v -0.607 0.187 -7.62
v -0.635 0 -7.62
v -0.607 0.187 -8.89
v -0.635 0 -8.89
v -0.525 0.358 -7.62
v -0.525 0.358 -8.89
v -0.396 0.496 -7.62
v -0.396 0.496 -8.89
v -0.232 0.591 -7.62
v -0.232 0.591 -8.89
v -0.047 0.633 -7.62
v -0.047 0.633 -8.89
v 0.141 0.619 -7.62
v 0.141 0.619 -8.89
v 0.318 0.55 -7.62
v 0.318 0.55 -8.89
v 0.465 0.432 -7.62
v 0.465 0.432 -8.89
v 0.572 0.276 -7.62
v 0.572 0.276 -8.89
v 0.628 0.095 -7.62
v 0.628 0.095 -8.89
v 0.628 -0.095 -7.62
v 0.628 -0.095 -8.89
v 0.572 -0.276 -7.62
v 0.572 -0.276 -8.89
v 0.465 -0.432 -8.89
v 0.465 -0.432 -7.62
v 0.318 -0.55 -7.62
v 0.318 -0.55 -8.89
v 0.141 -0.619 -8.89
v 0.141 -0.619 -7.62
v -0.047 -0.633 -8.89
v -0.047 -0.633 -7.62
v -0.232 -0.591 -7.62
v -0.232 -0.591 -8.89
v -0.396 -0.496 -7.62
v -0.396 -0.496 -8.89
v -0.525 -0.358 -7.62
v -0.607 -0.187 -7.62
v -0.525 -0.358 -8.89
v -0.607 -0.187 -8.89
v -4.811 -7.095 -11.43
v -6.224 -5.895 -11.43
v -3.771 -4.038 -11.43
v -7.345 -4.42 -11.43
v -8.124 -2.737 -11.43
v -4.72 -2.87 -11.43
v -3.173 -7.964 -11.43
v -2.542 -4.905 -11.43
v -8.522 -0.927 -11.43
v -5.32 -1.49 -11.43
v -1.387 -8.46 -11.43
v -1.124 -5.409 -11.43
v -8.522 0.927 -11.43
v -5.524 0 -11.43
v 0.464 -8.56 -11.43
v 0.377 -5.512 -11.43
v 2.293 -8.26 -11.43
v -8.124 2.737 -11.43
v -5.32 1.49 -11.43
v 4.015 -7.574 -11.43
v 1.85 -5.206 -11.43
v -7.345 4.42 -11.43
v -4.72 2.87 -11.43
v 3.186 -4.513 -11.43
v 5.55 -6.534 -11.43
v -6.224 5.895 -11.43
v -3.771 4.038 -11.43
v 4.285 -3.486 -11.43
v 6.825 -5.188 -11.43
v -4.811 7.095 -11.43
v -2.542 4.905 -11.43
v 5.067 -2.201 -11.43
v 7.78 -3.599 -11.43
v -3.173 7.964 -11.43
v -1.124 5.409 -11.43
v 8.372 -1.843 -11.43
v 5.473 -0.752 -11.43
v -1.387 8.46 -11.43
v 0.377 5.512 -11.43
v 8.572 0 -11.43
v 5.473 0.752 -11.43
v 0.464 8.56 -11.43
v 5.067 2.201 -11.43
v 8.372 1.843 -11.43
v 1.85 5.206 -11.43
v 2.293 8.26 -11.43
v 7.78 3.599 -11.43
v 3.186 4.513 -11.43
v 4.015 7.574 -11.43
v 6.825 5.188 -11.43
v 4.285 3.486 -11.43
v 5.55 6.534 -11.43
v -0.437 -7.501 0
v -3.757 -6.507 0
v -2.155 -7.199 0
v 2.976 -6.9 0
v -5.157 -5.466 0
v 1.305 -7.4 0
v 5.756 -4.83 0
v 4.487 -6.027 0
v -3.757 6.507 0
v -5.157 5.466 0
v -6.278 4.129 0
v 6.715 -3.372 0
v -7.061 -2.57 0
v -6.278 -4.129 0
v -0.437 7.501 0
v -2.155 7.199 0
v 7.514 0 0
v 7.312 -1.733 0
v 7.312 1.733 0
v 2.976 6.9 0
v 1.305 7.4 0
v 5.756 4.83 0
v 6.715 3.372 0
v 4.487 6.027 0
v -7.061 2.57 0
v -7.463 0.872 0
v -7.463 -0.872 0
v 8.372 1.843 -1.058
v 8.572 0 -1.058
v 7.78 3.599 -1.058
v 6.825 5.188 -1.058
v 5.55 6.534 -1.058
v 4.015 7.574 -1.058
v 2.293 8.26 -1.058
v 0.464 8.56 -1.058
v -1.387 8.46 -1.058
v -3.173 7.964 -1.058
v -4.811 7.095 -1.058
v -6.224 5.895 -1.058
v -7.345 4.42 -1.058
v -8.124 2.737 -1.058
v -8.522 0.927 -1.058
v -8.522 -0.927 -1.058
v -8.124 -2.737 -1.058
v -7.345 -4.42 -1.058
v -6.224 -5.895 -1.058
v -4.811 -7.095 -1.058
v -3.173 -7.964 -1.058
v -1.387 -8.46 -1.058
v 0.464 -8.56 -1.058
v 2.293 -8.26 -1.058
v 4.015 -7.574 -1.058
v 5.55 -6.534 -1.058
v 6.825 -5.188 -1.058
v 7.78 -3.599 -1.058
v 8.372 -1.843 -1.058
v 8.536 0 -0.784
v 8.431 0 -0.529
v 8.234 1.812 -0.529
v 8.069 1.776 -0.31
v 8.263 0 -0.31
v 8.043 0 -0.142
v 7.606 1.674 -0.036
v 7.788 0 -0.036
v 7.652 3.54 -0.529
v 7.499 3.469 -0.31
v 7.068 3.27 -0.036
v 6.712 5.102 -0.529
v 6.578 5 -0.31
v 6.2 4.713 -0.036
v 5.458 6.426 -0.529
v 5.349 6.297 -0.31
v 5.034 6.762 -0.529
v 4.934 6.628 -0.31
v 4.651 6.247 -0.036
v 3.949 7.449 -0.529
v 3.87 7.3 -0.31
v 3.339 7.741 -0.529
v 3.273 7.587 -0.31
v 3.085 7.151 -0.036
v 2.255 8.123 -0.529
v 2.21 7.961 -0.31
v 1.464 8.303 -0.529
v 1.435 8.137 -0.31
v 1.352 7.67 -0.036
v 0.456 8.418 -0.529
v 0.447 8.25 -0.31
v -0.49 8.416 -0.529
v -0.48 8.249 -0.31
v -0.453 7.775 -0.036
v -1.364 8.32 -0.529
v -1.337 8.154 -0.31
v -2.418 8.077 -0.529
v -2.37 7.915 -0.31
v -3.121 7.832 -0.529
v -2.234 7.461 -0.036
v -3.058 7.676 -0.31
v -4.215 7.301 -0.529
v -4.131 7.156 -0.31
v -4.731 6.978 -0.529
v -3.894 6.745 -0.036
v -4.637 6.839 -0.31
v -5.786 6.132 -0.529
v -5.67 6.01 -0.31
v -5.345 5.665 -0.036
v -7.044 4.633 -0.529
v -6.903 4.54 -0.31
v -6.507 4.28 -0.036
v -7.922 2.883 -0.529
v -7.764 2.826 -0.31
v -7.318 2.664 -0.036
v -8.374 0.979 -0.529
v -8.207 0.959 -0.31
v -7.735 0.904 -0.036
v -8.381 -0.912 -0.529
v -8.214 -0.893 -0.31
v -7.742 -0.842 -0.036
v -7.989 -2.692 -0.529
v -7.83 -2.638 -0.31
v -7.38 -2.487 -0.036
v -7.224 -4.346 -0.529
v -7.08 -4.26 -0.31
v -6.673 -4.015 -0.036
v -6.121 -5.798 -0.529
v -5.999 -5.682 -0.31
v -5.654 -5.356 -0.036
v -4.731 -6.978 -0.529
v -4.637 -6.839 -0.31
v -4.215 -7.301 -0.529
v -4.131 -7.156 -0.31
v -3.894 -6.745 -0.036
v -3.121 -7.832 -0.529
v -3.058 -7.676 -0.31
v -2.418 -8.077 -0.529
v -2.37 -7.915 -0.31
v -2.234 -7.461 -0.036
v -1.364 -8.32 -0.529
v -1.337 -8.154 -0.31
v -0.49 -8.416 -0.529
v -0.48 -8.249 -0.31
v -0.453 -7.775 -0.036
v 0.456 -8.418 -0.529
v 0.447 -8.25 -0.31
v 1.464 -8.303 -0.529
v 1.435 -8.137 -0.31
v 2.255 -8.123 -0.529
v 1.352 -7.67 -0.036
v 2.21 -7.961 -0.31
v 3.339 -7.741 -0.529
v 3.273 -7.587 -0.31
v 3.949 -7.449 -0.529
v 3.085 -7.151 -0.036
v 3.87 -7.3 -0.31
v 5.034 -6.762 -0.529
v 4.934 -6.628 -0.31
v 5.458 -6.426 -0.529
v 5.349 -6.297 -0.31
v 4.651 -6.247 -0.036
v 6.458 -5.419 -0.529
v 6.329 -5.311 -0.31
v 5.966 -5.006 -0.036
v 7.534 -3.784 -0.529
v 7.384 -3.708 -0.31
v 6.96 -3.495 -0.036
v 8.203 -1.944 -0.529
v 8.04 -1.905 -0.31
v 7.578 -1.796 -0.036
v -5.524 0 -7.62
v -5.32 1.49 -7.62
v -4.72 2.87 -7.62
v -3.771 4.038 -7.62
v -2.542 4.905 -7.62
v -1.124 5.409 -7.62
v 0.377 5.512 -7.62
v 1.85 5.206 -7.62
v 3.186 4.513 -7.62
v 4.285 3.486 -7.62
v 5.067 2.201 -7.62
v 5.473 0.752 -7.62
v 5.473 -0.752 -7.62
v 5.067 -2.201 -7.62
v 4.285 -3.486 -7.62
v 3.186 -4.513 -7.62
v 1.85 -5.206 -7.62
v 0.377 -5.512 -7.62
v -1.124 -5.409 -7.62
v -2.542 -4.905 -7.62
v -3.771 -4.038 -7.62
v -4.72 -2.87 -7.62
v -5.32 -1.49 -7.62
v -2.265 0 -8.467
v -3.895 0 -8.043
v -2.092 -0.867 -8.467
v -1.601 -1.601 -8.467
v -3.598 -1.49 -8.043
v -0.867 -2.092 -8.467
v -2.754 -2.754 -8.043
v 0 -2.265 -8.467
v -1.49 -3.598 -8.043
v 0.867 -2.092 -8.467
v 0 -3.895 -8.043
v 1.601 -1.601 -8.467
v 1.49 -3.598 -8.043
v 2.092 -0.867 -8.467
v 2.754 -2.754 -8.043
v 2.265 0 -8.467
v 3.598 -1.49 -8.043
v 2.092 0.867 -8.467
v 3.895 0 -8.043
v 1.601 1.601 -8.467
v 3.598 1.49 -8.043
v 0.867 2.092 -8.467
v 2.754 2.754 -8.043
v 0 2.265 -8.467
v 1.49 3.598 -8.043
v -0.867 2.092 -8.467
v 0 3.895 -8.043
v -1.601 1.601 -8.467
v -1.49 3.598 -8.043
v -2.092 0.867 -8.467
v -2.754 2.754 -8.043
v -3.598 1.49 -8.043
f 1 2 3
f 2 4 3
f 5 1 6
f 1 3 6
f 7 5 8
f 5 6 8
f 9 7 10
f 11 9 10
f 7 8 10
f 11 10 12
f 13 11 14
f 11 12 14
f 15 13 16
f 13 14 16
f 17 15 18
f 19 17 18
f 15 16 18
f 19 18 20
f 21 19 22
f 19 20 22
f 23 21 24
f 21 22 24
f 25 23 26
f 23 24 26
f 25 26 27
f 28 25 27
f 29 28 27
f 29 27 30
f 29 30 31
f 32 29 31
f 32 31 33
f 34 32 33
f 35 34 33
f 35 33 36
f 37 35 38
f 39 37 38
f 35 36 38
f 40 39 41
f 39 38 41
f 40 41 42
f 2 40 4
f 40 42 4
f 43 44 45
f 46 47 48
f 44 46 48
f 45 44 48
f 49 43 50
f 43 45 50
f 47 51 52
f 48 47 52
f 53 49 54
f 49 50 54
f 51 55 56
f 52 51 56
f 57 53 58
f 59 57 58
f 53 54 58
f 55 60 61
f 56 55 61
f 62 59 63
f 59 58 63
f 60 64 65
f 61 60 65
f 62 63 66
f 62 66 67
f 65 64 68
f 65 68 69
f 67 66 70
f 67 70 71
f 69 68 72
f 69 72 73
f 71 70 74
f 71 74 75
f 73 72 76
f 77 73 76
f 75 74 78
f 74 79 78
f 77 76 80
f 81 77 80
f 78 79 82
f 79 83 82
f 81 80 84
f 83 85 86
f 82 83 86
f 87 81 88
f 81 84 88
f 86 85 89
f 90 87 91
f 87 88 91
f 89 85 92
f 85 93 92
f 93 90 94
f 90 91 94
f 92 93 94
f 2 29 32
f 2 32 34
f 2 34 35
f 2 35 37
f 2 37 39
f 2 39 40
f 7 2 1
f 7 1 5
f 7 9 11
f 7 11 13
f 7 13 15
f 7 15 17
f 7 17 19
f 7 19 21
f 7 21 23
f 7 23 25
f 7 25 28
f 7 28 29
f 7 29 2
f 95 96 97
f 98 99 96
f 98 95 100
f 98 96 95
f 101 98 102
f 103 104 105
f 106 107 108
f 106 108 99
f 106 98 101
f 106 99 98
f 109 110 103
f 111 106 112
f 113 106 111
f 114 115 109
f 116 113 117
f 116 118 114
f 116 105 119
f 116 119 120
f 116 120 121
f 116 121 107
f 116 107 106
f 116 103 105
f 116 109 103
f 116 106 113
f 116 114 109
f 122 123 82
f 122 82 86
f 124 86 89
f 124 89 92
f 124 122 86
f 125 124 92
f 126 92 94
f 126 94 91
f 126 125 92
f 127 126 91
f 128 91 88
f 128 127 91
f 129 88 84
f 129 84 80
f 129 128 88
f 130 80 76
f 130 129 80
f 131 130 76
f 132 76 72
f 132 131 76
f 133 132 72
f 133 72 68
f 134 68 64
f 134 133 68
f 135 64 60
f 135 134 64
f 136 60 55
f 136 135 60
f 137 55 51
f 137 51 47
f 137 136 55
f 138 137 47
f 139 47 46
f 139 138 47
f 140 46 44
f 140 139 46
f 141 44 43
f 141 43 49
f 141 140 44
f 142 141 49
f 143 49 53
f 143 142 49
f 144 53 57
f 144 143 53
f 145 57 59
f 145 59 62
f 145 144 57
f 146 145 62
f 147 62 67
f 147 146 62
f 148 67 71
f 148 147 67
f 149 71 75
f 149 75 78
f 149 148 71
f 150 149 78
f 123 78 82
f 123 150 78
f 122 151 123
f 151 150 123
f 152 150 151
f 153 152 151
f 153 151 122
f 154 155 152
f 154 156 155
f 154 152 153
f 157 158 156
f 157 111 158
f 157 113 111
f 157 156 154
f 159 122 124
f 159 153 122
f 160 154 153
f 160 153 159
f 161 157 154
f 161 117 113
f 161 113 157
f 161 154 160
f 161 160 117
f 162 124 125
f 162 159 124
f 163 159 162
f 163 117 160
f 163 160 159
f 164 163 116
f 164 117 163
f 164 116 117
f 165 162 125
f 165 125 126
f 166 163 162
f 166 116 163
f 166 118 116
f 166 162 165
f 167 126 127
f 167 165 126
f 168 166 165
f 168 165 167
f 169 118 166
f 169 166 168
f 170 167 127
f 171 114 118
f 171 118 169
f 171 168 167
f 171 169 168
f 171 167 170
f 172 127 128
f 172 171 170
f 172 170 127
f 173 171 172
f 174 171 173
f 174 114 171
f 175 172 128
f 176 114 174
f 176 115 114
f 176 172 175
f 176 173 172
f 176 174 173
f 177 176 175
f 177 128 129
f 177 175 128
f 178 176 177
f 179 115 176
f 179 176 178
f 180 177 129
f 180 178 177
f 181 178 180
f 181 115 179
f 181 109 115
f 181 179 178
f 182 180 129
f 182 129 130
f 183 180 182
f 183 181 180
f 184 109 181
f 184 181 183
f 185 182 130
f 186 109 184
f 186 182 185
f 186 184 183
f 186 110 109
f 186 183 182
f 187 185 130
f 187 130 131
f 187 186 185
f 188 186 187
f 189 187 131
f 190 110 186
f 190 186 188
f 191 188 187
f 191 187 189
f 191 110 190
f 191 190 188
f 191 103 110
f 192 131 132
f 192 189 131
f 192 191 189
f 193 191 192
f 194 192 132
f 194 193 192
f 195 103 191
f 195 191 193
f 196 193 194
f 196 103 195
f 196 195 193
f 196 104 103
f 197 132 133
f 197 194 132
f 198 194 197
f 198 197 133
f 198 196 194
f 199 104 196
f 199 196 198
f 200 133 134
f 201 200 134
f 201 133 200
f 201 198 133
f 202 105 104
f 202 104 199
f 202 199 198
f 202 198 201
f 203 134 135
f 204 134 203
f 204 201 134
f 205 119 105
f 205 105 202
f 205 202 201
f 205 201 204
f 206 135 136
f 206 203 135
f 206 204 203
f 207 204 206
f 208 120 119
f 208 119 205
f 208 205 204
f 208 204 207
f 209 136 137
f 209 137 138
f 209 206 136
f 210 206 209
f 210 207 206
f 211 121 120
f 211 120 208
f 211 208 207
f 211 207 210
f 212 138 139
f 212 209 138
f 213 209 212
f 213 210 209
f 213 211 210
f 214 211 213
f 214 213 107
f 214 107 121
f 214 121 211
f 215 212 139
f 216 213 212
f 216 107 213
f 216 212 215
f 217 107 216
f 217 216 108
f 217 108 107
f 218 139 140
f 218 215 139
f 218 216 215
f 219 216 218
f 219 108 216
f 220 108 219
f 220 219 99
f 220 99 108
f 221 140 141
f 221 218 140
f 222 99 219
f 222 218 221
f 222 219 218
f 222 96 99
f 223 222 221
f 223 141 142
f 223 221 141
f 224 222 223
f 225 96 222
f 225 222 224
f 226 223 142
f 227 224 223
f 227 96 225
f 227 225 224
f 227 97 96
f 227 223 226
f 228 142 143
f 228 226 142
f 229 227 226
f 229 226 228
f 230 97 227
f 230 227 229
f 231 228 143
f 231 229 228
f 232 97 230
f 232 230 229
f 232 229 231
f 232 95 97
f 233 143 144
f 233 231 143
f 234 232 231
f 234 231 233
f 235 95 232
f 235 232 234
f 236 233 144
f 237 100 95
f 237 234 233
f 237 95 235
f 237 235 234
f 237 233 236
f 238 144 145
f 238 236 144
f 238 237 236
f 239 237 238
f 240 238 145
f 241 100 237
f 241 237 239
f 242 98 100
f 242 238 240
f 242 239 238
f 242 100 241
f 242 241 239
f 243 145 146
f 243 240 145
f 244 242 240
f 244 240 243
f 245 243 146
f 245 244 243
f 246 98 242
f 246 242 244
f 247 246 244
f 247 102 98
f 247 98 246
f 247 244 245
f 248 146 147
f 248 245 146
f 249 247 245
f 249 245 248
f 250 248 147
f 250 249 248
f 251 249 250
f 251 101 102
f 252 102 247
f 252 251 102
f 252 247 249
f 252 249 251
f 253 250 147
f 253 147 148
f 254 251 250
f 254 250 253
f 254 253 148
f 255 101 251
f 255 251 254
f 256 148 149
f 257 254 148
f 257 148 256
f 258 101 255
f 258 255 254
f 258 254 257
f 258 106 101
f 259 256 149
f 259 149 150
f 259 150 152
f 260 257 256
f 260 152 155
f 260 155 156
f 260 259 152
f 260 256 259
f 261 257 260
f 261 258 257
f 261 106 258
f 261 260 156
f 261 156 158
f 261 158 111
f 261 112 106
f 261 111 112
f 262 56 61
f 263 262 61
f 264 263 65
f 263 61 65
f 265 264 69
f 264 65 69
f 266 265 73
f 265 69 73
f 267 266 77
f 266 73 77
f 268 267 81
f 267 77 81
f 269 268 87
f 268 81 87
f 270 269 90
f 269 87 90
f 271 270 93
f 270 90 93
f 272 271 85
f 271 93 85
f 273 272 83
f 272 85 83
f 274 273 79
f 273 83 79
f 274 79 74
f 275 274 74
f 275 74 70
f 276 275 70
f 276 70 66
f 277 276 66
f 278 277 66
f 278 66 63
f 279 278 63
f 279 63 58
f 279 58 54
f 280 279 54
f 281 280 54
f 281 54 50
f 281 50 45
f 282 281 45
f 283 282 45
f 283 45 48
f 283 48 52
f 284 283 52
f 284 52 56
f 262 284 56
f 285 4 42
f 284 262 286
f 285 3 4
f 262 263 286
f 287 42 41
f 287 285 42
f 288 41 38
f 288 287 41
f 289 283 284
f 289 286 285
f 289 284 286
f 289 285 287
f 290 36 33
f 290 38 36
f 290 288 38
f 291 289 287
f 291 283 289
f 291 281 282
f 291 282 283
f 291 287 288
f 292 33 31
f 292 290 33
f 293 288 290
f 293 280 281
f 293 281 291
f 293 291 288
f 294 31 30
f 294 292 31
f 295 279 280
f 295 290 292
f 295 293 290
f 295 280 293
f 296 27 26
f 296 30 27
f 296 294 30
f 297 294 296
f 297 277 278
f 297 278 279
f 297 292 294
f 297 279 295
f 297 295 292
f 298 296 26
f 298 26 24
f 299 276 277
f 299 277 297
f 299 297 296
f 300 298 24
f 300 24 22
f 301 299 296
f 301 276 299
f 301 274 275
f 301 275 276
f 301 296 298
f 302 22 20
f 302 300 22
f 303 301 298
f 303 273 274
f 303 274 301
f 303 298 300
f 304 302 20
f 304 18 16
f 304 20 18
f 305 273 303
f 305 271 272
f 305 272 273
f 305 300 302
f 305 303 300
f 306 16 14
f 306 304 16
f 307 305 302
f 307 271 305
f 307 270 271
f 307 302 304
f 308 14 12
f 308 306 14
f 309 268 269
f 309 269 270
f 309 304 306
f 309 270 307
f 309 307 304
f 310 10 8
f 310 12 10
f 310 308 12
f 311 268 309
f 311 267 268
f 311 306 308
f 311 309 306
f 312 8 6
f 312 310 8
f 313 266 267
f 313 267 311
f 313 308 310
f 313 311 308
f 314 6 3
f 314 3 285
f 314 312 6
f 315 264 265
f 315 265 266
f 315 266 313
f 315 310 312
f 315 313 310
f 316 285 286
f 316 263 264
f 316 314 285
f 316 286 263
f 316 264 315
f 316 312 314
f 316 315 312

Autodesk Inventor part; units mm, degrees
ref_plane "YZ Plane" through (0, 0, 0) normal (1, 0, 0) x (0, 1, 0)
ref_plane "XZ Plane" through (0, 0, 0) normal (0, 1, 0) x (-1, 0, 0)
ref_plane "XY Plane" through (0, 0, 0) normal (0, 0, 1) x (1, 0, 0)
sketch "Sketch1" plane through (0, 0, 0) normal (0, 0, 1) x (1, 0, 0)
  circle A0 centre (0, 0) radius 8.5725
  dimension "d0" = 17.145
extrude "Extrusion1" add sketch "Sketch1" against normal blind 11.43
sketch "Sketch2" plane through (0, 0, -11.43) normal (0, 0, -1) x (-1, 0, 0)
  circle A0 centre (0, 0) radius 5.5245
  dimension "d3" = 11.049
extrude "Extrusion2" cut sketch "Sketch2" against normal blind 3.81
fillet "Fillet1" radius 1.0583 1 edges at (-8.5725, 0, 0)
ref_plane "Work Plane1" through (0, 0, -8.89) normal (0, 0, -1) x (-1, 0, 0)
sketch "Sketch3" plane through (0, 0, -8.89) normal (0, 0, -1) x (-1, 0, 0)
  circle A0 centre (0, 0) radius 0.635
  dimension "d8" = 1.27
loft "Loft1" add profiles "Sketch3" section 1 edges at (5.5245, 0, -7.62)
sketch "Sketch4" plane through (0, 0, -8.89) normal (0, 0, -1) x (-1, 0, 0)
  circle A0 centre (0, 0) radius 0.635 projected
  circle A1 centre (0, 0) radius 0.9525
  dimension "d13" = 1.905
extrude "Extrusion3" cut sketch "Sketch4" against normal blind 1.27 contours A0
equation "\"d0\" = outsideDiameterForHoleInCat"
equation "\"d1\" = length"
equation "\"d3\" = holeForInteriorButton"
equation "\"d4\" = depthForInteriorButton"
equation "\"d6\" = topFilletRadius"
equation "\"d8\" = offsetCircleDiameter"
equation "\"d13\" = glueHoleDiameter"
equation "\"d14\" = glueHoleDepth"
equation "\"outsideDiameterForHoleInCat\" = 17.145"
equation "\"length\" = 11.43"
equation "\"holeForInteriorButton\" = 11.049"
equation "\"depthForInteriorButton\" = 3.81"
equation "\"planeOffset\" = 0.635"
equation "\"offsetCircleDiameter\" = 1.27"
equation "\"topFilletRadius\" = 1.05833"
equation "\"glueHoleDiameter\" = 1.905"
equation "\"glueHoleDepth\" = 1.27"
properties part number "buttonForCatButton"
